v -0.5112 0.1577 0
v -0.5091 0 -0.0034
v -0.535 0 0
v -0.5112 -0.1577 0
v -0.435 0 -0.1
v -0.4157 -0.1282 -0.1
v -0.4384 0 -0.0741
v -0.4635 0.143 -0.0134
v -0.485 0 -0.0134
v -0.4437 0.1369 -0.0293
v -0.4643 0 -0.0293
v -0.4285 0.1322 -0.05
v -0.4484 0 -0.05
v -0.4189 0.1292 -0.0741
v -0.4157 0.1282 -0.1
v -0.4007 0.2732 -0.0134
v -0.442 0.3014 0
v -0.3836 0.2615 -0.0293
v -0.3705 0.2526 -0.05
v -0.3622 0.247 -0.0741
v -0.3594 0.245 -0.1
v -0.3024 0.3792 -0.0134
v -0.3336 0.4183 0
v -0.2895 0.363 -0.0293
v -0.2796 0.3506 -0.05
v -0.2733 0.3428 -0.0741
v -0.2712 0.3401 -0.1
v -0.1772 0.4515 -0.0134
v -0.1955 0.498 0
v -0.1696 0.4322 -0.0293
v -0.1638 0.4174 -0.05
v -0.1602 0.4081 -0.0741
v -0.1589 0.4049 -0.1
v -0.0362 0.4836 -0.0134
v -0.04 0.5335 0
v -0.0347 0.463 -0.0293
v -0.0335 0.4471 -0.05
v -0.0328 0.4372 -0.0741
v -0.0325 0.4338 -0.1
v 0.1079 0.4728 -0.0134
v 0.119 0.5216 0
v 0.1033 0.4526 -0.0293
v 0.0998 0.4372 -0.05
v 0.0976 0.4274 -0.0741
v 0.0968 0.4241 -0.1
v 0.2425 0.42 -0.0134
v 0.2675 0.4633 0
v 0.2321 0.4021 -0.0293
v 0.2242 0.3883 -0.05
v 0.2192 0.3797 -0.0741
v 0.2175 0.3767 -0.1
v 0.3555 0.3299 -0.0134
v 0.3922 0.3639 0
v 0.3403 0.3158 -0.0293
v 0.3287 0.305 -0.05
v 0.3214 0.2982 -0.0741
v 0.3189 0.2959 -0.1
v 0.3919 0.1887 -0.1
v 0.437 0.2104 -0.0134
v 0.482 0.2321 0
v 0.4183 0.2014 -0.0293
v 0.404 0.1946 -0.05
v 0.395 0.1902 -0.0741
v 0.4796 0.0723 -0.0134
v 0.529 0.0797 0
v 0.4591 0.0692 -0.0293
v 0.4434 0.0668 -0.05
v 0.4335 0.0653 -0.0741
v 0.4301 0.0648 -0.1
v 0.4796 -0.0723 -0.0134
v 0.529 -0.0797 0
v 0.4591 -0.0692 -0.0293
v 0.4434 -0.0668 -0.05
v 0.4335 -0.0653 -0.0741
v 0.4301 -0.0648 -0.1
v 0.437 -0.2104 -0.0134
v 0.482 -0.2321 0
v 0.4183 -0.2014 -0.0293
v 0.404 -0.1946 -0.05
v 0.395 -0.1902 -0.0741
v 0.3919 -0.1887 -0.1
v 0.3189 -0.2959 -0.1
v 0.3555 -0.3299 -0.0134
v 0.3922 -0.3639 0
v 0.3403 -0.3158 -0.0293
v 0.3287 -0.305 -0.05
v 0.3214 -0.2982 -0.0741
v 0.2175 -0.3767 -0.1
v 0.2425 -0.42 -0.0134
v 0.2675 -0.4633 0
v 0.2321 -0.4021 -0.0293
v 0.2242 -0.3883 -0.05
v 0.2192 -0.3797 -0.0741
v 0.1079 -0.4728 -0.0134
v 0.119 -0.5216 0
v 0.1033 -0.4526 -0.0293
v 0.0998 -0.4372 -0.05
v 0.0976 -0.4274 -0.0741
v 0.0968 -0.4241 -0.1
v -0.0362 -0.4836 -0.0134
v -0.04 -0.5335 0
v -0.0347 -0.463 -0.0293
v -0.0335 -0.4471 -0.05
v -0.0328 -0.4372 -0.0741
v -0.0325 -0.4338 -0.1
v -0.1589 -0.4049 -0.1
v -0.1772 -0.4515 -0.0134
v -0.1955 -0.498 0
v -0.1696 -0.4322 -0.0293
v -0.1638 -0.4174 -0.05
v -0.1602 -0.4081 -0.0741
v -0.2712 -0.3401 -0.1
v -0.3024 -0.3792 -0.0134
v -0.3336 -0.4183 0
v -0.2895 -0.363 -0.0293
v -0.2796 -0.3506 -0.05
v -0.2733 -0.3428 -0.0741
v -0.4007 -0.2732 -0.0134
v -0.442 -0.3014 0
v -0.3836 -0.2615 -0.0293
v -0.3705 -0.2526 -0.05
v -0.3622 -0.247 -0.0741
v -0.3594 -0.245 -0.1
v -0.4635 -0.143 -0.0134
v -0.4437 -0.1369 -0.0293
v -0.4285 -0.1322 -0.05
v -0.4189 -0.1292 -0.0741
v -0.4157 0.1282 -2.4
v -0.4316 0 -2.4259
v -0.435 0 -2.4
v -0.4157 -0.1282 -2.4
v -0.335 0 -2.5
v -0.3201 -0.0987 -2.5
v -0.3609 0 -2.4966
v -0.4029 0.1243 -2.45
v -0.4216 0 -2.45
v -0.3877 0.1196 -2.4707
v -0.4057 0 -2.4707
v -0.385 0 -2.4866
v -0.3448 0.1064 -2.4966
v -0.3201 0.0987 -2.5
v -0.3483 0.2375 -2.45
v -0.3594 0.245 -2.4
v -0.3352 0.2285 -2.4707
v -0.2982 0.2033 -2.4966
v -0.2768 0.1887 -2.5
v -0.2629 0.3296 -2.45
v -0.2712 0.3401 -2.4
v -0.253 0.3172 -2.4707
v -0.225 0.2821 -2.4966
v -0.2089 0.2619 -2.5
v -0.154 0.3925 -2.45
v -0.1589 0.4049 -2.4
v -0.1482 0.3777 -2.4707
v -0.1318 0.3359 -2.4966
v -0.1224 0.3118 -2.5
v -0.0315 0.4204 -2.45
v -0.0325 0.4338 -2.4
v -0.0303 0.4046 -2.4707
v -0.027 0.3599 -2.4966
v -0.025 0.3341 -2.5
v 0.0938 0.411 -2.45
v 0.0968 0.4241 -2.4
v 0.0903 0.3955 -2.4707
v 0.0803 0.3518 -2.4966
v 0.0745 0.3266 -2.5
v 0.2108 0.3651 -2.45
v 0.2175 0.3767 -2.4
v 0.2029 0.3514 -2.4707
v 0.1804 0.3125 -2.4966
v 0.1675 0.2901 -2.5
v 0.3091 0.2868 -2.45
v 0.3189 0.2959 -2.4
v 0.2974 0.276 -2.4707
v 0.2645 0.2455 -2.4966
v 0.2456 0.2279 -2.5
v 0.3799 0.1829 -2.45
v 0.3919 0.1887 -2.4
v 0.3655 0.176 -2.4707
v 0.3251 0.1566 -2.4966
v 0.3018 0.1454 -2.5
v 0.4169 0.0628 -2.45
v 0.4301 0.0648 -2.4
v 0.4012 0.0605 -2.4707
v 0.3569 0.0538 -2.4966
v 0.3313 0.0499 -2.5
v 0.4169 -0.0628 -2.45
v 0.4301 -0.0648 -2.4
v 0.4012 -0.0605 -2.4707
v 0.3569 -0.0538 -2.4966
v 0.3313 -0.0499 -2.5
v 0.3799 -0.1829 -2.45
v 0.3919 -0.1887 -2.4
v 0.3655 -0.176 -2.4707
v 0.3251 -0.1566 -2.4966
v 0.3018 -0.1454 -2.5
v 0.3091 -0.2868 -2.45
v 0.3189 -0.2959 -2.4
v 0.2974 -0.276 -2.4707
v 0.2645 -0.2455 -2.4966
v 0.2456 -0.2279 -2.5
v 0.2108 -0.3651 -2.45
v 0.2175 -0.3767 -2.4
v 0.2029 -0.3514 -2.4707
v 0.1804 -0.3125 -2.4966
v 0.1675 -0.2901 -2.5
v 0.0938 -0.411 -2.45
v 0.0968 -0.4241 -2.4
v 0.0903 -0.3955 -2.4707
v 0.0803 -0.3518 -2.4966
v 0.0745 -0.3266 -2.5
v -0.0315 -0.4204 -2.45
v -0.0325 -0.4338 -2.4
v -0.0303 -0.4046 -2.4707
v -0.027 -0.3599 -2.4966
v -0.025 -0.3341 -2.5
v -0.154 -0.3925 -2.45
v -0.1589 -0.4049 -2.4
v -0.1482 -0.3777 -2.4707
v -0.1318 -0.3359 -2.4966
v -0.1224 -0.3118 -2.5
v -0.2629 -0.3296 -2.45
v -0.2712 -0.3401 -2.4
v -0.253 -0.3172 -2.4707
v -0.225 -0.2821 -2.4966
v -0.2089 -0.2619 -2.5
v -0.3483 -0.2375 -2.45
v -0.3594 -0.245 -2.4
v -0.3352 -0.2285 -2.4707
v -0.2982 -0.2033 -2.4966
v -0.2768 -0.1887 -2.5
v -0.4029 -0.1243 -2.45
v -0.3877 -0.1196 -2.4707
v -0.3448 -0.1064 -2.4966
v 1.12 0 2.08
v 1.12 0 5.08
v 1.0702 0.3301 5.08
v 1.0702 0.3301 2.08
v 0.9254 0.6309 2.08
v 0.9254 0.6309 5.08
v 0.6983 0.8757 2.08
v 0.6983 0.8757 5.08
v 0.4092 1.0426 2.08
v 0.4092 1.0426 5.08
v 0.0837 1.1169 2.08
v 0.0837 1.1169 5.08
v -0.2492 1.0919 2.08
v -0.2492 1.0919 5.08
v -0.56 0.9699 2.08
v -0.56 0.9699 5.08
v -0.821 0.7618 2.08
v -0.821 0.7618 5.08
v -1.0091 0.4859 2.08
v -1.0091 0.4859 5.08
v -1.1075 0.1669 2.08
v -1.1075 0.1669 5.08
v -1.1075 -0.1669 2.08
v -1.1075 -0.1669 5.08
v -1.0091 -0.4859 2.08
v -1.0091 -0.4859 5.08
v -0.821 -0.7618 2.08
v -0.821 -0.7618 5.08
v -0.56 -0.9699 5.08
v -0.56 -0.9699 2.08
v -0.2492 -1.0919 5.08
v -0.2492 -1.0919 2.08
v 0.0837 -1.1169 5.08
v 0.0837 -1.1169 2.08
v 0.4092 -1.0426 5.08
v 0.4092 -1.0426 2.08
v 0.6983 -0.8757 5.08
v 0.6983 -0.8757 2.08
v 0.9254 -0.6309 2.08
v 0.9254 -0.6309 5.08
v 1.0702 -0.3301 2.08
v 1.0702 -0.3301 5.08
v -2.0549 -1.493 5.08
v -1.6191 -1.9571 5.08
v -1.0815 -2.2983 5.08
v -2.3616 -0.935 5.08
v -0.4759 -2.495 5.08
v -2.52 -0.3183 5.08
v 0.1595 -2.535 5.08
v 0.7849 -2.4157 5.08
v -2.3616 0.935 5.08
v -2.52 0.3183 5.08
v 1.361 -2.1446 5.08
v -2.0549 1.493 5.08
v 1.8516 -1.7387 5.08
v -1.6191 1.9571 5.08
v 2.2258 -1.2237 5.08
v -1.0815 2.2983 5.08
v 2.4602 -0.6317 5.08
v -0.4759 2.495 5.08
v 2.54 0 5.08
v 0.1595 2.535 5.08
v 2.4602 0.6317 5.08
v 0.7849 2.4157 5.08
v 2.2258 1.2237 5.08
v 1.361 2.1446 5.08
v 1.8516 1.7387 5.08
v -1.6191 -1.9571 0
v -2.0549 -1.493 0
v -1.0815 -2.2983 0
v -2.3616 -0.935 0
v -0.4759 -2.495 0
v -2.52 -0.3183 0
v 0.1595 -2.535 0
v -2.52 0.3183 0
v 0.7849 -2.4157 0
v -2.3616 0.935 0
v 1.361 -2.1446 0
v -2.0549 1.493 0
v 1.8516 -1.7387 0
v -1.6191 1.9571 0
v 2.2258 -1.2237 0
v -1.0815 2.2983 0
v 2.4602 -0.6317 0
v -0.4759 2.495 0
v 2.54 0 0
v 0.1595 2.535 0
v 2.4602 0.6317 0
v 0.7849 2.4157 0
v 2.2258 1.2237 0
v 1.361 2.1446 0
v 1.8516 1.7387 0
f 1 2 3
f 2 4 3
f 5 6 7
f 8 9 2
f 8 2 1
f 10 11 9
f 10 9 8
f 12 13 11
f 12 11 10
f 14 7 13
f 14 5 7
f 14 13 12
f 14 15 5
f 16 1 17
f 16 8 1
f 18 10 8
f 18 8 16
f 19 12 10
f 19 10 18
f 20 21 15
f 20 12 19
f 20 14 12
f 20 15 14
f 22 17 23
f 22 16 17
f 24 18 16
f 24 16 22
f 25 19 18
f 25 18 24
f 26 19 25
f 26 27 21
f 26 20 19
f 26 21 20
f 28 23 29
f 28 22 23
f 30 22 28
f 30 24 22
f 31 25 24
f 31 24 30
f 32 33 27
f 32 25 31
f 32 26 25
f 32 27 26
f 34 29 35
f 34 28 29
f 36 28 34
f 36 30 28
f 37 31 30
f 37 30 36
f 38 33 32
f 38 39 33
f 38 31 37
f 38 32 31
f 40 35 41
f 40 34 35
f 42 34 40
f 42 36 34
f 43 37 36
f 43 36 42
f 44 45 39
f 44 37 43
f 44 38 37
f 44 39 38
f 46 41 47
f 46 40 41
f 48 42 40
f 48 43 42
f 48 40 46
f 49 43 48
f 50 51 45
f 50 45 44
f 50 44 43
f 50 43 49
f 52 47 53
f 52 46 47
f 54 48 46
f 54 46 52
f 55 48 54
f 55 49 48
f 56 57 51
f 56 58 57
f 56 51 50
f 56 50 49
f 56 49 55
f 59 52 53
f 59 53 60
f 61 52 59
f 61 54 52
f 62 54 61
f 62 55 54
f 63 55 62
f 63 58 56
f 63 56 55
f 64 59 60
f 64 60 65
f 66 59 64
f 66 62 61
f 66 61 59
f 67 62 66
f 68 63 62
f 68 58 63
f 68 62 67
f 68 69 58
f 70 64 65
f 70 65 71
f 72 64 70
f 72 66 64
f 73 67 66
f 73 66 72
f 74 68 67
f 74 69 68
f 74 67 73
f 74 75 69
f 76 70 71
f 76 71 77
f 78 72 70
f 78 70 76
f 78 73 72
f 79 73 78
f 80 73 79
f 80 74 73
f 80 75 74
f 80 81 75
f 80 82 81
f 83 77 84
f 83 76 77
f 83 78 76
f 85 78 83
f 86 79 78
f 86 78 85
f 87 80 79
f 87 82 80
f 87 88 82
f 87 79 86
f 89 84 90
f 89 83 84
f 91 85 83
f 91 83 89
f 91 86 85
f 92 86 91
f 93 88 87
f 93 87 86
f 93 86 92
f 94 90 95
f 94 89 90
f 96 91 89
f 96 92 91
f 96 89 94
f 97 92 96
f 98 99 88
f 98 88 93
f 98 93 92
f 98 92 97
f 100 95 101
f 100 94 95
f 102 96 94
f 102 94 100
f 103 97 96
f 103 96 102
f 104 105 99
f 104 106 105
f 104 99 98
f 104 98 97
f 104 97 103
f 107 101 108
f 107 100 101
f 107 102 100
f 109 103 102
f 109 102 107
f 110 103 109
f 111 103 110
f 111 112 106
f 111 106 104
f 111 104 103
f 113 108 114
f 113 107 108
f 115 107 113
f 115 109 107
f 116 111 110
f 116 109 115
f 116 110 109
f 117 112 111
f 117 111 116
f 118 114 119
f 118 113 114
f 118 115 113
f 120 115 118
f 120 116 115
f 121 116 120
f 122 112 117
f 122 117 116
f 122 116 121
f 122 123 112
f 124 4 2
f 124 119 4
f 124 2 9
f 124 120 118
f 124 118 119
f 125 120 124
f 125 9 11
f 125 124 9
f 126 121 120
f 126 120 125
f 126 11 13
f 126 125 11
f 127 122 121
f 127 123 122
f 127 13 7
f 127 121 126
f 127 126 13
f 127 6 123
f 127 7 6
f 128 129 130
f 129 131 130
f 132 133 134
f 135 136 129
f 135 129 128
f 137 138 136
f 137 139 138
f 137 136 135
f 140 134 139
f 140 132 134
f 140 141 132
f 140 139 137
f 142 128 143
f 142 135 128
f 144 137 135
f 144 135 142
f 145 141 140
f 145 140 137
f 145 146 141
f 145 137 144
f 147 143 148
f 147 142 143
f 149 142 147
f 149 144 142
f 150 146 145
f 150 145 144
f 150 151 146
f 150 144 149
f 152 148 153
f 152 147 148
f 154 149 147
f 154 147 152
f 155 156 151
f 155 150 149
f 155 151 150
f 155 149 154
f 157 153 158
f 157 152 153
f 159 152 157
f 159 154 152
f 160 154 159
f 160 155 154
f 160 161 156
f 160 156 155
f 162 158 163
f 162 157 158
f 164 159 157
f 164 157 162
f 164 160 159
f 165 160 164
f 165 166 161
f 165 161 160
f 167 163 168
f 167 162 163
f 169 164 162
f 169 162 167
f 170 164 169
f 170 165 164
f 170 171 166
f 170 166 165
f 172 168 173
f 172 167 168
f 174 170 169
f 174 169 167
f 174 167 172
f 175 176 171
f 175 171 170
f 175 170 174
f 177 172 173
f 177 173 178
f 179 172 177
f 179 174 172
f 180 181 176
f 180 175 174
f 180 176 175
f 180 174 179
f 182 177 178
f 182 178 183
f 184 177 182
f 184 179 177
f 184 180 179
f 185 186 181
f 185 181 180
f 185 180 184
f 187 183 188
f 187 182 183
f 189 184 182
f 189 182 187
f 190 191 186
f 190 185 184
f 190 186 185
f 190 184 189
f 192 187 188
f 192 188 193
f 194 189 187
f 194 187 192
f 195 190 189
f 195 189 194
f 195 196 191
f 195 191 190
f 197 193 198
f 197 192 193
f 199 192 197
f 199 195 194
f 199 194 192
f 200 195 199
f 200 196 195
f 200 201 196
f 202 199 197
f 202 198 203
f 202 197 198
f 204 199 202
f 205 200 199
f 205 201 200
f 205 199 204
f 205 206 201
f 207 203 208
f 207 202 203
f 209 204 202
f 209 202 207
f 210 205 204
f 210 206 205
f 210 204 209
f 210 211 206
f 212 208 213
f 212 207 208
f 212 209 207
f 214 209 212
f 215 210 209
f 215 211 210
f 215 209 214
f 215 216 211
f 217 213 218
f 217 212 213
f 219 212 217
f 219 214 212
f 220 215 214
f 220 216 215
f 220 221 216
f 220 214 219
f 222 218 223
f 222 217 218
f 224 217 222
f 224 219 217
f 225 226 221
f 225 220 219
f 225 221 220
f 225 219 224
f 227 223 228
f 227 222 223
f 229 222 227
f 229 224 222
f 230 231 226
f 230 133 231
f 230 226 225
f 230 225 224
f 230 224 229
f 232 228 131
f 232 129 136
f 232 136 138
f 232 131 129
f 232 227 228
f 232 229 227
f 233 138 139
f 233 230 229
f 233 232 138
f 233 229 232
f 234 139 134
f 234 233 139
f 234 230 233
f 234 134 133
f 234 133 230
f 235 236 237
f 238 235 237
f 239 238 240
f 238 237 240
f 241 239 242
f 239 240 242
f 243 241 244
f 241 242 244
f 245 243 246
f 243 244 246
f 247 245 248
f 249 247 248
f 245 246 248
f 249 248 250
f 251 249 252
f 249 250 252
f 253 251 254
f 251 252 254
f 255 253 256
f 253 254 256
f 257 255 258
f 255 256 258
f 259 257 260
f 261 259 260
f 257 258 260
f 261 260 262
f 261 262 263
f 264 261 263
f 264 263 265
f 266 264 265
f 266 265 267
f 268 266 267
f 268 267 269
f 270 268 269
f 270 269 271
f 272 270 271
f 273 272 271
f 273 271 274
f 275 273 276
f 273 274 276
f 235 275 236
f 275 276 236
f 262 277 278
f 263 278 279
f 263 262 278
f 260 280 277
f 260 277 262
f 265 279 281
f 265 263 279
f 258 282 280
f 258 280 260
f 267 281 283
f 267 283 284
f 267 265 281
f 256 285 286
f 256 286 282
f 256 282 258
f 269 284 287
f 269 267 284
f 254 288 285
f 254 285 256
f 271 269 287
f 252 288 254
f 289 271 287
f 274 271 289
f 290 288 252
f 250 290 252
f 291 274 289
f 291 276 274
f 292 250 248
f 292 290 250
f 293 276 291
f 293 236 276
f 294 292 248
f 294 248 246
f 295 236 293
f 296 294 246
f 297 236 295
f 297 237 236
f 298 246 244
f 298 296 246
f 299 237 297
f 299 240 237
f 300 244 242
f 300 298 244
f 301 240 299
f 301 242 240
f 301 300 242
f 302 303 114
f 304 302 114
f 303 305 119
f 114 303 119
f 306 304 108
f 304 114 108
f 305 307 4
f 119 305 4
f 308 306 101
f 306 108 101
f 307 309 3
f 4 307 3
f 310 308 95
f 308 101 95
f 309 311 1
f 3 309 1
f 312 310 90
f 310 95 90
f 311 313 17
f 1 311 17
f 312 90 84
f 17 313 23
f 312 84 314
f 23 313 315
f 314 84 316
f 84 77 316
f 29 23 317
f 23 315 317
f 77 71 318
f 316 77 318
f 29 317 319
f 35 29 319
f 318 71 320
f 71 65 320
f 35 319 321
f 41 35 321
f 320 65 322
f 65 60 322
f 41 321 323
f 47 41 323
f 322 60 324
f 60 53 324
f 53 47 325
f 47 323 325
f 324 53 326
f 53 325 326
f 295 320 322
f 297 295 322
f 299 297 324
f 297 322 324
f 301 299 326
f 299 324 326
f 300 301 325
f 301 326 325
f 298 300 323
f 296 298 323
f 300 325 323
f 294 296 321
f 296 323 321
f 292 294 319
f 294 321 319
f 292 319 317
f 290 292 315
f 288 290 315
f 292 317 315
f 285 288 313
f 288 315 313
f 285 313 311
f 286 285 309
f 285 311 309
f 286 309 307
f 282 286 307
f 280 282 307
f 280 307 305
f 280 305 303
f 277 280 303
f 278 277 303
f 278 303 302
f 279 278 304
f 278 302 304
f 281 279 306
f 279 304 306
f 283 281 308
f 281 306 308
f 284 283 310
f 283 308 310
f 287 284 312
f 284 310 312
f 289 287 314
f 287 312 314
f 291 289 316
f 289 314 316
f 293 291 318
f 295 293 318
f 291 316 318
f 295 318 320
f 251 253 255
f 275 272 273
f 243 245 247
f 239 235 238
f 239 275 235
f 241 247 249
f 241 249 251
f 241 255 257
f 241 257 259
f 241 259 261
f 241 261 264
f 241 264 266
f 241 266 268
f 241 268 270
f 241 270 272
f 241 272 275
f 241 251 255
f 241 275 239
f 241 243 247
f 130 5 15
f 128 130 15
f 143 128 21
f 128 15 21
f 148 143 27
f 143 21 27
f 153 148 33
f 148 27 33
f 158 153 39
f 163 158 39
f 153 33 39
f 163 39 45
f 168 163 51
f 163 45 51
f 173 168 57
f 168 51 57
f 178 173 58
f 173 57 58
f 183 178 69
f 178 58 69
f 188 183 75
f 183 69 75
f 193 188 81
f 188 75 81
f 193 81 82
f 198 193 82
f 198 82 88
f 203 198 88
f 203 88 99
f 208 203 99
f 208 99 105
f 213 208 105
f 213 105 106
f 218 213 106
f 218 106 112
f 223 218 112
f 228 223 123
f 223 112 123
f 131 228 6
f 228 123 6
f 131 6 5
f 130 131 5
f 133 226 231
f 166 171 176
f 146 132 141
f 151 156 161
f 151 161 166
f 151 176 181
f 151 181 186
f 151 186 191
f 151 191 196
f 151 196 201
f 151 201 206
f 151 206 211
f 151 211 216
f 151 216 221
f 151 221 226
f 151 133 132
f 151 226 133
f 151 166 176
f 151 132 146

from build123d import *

# Parameters (mm, degrees)
SKETCH1_R           = 2.54
BOSS_EXTRUDE1_DEPTH = 5.08
SKETCH2_R           = 1.12
CUT_EXTRUDE1_DEPTH  = 3
SKETCH3_R           = 0.435
BOSS_EXTRUDE2_DEPTH = 2.5
FILLET1_R           = 0.1
FILLET2_R           = 0.1


with BuildPart() as part:
    # Sketch1 → Boss-Extrude1 (new body)
    with BuildSketch(Plane.XY):
        Circle(SKETCH1_R)
    extrude(amount=BOSS_EXTRUDE1_DEPTH)

    # Sketch2 → Cut-Extrude1 (cut)
    with BuildSketch(Plane.XY.offset(5.08)):
        Circle(SKETCH2_R)
    extrude(amount=-CUT_EXTRUDE1_DEPTH, mode=Mode.SUBTRACT)

    # Sketch3 → Boss-Extrude2 (add)
    with BuildSketch(Plane(origin=(0, 0, 0), x_dir=(-1, 0, 0), z_dir=(0, 0, -1))):
        Circle(SKETCH3_R)
    extrude(amount=BOSS_EXTRUDE2_DEPTH)

    # Fillet1
    fillet1_edges = [part.edges().sort_by_distance(p)[0] for p in [
        (0.435, 0, 0),
    ]]
    fillet(fillet1_edges, radius=FILLET1_R)

    # Fillet2
    fillet2_edges = [part.edges().sort_by_distance(p)[0] for p in [
        (0.435, 0, -2.5),
    ]]
    fillet(fillet2_edges, radius=FILLET2_R)


solid = part.part
